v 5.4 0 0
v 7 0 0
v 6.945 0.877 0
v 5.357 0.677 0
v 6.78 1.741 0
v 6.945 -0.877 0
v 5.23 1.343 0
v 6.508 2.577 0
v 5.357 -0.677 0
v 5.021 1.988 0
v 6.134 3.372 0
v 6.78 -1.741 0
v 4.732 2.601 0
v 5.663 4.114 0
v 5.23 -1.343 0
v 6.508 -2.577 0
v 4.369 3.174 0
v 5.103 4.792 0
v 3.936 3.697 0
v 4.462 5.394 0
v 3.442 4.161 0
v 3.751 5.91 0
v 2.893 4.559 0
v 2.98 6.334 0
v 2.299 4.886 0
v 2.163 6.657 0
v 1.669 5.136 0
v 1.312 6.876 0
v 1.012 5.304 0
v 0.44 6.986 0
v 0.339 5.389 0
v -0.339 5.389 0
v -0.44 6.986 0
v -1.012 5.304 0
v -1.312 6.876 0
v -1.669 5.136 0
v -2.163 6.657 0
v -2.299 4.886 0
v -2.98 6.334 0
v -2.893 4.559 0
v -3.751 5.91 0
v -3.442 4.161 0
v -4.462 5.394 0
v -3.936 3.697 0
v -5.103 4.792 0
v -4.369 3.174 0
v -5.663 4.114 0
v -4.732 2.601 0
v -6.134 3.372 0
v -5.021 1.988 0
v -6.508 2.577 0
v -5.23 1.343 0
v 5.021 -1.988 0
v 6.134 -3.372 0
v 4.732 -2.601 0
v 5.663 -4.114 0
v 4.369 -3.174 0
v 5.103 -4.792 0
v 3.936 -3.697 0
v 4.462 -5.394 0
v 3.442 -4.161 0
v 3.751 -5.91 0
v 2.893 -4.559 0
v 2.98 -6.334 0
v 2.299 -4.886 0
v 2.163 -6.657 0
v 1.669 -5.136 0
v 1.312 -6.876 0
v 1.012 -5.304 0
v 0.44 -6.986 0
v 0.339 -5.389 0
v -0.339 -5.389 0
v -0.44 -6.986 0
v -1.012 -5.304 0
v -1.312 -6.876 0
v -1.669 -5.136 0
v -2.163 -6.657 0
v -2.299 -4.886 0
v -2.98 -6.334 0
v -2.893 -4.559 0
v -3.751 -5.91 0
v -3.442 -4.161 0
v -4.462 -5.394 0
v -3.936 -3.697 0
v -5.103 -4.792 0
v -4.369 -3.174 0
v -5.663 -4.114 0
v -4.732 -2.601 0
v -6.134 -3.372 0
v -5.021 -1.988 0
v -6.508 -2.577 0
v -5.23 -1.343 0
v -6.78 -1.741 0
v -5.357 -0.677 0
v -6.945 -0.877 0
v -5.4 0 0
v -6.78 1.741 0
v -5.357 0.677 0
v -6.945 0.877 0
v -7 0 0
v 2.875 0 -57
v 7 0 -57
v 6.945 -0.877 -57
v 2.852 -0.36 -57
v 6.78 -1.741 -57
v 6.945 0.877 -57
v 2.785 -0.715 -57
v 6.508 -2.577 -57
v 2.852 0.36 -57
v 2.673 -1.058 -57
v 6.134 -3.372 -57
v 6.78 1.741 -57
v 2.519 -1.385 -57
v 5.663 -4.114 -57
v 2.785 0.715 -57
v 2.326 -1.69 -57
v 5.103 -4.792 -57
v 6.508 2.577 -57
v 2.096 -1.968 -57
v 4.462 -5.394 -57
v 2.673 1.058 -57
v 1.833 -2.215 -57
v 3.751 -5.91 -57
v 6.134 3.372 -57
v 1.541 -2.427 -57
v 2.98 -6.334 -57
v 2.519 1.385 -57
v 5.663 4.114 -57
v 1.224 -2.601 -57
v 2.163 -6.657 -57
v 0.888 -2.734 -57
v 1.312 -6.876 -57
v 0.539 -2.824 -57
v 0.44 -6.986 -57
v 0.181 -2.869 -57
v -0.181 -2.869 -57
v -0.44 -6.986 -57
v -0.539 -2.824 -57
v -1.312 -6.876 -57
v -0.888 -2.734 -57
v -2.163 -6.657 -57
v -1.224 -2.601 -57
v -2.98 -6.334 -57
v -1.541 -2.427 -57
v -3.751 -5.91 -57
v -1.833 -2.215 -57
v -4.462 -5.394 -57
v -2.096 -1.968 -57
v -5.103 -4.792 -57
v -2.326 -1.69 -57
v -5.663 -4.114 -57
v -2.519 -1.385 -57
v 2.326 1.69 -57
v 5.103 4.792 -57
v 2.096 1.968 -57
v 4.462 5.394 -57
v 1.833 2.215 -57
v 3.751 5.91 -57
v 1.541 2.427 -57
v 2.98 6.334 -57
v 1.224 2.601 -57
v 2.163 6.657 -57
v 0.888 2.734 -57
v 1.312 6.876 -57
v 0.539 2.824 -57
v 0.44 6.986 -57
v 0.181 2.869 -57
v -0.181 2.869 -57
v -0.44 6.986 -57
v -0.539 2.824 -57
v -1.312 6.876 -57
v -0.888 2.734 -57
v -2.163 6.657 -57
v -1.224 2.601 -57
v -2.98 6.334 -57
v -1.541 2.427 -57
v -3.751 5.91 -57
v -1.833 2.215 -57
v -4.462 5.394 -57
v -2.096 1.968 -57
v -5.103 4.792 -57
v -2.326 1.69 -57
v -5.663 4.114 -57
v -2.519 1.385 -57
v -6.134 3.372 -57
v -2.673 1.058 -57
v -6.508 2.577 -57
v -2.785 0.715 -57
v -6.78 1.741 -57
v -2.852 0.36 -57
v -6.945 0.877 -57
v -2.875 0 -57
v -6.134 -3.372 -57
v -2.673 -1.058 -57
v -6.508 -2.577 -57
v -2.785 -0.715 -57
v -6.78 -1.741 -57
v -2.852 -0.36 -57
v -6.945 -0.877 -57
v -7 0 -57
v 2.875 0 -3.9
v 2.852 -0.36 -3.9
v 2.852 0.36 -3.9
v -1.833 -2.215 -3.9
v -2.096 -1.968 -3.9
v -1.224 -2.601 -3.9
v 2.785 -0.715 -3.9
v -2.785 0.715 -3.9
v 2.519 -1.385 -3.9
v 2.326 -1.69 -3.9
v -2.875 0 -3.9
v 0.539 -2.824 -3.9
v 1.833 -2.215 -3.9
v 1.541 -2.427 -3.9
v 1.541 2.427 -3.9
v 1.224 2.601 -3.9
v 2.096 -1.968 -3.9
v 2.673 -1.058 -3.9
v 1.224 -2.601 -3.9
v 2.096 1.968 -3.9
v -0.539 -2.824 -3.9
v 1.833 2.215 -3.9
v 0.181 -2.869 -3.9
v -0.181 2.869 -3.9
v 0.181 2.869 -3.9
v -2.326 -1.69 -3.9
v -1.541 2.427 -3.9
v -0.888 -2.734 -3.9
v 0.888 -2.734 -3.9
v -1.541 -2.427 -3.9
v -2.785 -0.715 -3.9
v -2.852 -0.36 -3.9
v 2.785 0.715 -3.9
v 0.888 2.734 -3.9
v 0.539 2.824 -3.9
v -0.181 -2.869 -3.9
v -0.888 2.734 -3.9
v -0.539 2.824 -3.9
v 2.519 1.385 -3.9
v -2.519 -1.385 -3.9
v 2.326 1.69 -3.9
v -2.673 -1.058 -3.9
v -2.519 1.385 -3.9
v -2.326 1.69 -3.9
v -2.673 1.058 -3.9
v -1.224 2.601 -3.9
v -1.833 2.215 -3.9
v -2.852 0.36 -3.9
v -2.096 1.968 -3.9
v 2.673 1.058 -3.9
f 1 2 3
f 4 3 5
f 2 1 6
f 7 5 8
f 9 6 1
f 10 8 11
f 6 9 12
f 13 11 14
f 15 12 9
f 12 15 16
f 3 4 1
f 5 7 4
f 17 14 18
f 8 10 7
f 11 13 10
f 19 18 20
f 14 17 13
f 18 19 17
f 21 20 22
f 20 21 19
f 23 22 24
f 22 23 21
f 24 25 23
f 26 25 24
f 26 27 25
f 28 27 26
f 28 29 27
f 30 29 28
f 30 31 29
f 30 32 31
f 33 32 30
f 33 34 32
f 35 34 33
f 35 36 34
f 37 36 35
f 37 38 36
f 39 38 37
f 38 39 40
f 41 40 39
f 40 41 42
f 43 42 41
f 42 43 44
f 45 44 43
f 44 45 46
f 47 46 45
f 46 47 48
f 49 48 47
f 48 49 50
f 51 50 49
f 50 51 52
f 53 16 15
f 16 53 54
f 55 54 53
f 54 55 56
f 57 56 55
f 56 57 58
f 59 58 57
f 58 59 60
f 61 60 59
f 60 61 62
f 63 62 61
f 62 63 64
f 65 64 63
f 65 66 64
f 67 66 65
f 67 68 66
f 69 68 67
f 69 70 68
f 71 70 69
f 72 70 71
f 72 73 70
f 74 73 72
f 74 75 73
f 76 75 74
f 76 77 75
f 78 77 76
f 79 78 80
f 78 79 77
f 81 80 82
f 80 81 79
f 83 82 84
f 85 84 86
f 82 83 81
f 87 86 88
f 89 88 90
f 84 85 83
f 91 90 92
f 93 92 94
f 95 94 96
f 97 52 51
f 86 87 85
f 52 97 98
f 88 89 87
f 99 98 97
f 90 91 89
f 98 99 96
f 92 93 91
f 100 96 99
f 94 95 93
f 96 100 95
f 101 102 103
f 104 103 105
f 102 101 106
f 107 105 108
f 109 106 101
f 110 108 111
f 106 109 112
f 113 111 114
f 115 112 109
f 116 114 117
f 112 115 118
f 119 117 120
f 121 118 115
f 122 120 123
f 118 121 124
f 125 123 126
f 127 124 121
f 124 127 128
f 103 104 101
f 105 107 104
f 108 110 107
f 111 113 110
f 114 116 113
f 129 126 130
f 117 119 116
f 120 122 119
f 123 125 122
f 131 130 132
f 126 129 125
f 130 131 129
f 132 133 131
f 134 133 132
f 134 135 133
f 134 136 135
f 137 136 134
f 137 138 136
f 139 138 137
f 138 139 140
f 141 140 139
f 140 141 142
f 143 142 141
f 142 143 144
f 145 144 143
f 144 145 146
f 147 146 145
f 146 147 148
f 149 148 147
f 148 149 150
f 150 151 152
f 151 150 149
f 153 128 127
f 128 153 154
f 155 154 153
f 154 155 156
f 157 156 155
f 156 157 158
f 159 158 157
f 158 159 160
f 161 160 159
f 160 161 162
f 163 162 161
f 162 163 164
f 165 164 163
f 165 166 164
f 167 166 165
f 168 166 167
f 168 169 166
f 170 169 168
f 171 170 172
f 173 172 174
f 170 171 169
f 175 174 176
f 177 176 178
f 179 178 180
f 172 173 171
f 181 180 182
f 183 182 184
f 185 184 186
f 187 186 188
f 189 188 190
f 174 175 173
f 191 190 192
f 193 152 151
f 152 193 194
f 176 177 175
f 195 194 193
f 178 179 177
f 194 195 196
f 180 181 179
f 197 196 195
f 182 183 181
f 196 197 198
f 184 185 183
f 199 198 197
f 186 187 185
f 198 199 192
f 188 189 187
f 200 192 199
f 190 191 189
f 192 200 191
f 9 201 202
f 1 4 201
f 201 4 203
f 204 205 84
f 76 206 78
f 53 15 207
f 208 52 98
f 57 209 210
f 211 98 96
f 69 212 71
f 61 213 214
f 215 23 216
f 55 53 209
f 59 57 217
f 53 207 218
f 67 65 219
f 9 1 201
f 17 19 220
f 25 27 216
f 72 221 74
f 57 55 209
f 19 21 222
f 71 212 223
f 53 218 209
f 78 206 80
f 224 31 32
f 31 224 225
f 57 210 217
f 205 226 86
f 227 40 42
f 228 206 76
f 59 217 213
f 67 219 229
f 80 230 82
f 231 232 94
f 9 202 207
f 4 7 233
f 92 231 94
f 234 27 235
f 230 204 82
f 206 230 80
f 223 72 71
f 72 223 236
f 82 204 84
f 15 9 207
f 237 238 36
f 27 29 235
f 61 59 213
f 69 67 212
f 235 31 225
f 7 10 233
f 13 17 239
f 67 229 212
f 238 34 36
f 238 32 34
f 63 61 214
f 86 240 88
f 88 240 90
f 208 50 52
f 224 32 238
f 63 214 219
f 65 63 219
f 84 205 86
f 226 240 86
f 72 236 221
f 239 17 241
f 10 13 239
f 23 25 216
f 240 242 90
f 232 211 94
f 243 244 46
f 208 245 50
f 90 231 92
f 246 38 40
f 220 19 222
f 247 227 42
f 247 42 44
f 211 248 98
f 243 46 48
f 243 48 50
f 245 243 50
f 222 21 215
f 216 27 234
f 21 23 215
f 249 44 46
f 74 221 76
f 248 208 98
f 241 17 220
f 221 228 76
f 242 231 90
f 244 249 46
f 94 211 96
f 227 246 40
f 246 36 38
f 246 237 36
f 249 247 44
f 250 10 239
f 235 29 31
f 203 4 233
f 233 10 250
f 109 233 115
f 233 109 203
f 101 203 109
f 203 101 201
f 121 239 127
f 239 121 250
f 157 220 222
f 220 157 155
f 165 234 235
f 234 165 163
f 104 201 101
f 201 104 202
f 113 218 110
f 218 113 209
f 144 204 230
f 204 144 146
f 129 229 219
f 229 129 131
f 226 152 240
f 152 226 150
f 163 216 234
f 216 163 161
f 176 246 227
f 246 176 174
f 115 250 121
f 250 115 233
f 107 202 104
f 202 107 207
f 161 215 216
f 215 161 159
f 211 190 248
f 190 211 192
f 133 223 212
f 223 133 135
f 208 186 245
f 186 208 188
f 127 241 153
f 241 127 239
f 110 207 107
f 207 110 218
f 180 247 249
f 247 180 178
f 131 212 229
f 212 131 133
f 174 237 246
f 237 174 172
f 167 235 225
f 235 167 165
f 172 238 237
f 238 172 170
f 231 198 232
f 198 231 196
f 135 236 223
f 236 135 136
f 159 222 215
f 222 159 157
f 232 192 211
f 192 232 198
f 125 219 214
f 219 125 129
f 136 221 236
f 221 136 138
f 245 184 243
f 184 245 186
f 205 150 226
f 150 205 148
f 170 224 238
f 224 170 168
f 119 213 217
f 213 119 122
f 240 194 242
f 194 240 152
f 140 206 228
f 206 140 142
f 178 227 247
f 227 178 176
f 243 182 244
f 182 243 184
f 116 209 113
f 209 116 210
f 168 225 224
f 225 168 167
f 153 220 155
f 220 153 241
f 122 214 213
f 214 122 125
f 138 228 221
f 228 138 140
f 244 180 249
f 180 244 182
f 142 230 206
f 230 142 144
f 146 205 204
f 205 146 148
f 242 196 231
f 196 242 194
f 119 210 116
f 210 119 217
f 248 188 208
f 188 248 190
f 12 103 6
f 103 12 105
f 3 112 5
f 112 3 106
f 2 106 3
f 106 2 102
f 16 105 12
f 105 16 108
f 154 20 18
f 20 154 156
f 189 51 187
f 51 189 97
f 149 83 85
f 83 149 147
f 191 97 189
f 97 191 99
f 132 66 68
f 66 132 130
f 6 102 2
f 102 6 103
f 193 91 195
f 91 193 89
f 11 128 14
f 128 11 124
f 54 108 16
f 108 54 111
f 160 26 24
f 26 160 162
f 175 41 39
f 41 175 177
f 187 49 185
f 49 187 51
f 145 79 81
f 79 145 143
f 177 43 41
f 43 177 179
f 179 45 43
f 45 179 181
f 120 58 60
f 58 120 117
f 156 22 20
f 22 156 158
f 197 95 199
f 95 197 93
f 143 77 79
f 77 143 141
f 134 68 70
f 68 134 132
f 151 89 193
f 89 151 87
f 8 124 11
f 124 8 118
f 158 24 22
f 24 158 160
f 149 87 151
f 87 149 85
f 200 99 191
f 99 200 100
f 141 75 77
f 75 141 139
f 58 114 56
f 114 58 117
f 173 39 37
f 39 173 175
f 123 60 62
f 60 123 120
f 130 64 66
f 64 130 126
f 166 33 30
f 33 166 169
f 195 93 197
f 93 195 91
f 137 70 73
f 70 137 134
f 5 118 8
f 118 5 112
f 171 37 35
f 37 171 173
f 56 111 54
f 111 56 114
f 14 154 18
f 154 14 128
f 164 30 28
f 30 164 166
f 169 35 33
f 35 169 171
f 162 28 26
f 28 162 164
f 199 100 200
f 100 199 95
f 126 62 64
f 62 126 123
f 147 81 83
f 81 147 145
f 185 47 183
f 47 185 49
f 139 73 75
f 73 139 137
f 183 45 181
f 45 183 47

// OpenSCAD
$fn = 50;


difference() {
	union() {
		translate(v = [0, 0, -57.0000000000]) {
			cylinder(h = 57, r = 7.0000000000);
		}
		cylinder(h = 0, r = 13.0000000000);
	}
	union() {
		translate(v = [0, 0, 0]) {
			rotate(a = [0, 0, 0]) {
				difference() {
					union() {
						#translate(v = [0, 0, -57.0000000000]) {
							cylinder(h = 57, r = 2.6000000000);
						}
						#translate(v = [0, 0, -3.9000000000]) {
							cylinder(h = 3.9000000000, r1 = 2.8750000000, r2 = 5.4000000000);
						}
						#translate(v = [0, 0, -57.0000000000]) {
							cylinder(h = 57, r = 2.8750000000);
						}
						#translate(v = [0, 0, -57.0000000000]) {
							cylinder(h = 57, r = 2.6000000000);
						}
					}
					union();
				}
			}
		}
	}
}
